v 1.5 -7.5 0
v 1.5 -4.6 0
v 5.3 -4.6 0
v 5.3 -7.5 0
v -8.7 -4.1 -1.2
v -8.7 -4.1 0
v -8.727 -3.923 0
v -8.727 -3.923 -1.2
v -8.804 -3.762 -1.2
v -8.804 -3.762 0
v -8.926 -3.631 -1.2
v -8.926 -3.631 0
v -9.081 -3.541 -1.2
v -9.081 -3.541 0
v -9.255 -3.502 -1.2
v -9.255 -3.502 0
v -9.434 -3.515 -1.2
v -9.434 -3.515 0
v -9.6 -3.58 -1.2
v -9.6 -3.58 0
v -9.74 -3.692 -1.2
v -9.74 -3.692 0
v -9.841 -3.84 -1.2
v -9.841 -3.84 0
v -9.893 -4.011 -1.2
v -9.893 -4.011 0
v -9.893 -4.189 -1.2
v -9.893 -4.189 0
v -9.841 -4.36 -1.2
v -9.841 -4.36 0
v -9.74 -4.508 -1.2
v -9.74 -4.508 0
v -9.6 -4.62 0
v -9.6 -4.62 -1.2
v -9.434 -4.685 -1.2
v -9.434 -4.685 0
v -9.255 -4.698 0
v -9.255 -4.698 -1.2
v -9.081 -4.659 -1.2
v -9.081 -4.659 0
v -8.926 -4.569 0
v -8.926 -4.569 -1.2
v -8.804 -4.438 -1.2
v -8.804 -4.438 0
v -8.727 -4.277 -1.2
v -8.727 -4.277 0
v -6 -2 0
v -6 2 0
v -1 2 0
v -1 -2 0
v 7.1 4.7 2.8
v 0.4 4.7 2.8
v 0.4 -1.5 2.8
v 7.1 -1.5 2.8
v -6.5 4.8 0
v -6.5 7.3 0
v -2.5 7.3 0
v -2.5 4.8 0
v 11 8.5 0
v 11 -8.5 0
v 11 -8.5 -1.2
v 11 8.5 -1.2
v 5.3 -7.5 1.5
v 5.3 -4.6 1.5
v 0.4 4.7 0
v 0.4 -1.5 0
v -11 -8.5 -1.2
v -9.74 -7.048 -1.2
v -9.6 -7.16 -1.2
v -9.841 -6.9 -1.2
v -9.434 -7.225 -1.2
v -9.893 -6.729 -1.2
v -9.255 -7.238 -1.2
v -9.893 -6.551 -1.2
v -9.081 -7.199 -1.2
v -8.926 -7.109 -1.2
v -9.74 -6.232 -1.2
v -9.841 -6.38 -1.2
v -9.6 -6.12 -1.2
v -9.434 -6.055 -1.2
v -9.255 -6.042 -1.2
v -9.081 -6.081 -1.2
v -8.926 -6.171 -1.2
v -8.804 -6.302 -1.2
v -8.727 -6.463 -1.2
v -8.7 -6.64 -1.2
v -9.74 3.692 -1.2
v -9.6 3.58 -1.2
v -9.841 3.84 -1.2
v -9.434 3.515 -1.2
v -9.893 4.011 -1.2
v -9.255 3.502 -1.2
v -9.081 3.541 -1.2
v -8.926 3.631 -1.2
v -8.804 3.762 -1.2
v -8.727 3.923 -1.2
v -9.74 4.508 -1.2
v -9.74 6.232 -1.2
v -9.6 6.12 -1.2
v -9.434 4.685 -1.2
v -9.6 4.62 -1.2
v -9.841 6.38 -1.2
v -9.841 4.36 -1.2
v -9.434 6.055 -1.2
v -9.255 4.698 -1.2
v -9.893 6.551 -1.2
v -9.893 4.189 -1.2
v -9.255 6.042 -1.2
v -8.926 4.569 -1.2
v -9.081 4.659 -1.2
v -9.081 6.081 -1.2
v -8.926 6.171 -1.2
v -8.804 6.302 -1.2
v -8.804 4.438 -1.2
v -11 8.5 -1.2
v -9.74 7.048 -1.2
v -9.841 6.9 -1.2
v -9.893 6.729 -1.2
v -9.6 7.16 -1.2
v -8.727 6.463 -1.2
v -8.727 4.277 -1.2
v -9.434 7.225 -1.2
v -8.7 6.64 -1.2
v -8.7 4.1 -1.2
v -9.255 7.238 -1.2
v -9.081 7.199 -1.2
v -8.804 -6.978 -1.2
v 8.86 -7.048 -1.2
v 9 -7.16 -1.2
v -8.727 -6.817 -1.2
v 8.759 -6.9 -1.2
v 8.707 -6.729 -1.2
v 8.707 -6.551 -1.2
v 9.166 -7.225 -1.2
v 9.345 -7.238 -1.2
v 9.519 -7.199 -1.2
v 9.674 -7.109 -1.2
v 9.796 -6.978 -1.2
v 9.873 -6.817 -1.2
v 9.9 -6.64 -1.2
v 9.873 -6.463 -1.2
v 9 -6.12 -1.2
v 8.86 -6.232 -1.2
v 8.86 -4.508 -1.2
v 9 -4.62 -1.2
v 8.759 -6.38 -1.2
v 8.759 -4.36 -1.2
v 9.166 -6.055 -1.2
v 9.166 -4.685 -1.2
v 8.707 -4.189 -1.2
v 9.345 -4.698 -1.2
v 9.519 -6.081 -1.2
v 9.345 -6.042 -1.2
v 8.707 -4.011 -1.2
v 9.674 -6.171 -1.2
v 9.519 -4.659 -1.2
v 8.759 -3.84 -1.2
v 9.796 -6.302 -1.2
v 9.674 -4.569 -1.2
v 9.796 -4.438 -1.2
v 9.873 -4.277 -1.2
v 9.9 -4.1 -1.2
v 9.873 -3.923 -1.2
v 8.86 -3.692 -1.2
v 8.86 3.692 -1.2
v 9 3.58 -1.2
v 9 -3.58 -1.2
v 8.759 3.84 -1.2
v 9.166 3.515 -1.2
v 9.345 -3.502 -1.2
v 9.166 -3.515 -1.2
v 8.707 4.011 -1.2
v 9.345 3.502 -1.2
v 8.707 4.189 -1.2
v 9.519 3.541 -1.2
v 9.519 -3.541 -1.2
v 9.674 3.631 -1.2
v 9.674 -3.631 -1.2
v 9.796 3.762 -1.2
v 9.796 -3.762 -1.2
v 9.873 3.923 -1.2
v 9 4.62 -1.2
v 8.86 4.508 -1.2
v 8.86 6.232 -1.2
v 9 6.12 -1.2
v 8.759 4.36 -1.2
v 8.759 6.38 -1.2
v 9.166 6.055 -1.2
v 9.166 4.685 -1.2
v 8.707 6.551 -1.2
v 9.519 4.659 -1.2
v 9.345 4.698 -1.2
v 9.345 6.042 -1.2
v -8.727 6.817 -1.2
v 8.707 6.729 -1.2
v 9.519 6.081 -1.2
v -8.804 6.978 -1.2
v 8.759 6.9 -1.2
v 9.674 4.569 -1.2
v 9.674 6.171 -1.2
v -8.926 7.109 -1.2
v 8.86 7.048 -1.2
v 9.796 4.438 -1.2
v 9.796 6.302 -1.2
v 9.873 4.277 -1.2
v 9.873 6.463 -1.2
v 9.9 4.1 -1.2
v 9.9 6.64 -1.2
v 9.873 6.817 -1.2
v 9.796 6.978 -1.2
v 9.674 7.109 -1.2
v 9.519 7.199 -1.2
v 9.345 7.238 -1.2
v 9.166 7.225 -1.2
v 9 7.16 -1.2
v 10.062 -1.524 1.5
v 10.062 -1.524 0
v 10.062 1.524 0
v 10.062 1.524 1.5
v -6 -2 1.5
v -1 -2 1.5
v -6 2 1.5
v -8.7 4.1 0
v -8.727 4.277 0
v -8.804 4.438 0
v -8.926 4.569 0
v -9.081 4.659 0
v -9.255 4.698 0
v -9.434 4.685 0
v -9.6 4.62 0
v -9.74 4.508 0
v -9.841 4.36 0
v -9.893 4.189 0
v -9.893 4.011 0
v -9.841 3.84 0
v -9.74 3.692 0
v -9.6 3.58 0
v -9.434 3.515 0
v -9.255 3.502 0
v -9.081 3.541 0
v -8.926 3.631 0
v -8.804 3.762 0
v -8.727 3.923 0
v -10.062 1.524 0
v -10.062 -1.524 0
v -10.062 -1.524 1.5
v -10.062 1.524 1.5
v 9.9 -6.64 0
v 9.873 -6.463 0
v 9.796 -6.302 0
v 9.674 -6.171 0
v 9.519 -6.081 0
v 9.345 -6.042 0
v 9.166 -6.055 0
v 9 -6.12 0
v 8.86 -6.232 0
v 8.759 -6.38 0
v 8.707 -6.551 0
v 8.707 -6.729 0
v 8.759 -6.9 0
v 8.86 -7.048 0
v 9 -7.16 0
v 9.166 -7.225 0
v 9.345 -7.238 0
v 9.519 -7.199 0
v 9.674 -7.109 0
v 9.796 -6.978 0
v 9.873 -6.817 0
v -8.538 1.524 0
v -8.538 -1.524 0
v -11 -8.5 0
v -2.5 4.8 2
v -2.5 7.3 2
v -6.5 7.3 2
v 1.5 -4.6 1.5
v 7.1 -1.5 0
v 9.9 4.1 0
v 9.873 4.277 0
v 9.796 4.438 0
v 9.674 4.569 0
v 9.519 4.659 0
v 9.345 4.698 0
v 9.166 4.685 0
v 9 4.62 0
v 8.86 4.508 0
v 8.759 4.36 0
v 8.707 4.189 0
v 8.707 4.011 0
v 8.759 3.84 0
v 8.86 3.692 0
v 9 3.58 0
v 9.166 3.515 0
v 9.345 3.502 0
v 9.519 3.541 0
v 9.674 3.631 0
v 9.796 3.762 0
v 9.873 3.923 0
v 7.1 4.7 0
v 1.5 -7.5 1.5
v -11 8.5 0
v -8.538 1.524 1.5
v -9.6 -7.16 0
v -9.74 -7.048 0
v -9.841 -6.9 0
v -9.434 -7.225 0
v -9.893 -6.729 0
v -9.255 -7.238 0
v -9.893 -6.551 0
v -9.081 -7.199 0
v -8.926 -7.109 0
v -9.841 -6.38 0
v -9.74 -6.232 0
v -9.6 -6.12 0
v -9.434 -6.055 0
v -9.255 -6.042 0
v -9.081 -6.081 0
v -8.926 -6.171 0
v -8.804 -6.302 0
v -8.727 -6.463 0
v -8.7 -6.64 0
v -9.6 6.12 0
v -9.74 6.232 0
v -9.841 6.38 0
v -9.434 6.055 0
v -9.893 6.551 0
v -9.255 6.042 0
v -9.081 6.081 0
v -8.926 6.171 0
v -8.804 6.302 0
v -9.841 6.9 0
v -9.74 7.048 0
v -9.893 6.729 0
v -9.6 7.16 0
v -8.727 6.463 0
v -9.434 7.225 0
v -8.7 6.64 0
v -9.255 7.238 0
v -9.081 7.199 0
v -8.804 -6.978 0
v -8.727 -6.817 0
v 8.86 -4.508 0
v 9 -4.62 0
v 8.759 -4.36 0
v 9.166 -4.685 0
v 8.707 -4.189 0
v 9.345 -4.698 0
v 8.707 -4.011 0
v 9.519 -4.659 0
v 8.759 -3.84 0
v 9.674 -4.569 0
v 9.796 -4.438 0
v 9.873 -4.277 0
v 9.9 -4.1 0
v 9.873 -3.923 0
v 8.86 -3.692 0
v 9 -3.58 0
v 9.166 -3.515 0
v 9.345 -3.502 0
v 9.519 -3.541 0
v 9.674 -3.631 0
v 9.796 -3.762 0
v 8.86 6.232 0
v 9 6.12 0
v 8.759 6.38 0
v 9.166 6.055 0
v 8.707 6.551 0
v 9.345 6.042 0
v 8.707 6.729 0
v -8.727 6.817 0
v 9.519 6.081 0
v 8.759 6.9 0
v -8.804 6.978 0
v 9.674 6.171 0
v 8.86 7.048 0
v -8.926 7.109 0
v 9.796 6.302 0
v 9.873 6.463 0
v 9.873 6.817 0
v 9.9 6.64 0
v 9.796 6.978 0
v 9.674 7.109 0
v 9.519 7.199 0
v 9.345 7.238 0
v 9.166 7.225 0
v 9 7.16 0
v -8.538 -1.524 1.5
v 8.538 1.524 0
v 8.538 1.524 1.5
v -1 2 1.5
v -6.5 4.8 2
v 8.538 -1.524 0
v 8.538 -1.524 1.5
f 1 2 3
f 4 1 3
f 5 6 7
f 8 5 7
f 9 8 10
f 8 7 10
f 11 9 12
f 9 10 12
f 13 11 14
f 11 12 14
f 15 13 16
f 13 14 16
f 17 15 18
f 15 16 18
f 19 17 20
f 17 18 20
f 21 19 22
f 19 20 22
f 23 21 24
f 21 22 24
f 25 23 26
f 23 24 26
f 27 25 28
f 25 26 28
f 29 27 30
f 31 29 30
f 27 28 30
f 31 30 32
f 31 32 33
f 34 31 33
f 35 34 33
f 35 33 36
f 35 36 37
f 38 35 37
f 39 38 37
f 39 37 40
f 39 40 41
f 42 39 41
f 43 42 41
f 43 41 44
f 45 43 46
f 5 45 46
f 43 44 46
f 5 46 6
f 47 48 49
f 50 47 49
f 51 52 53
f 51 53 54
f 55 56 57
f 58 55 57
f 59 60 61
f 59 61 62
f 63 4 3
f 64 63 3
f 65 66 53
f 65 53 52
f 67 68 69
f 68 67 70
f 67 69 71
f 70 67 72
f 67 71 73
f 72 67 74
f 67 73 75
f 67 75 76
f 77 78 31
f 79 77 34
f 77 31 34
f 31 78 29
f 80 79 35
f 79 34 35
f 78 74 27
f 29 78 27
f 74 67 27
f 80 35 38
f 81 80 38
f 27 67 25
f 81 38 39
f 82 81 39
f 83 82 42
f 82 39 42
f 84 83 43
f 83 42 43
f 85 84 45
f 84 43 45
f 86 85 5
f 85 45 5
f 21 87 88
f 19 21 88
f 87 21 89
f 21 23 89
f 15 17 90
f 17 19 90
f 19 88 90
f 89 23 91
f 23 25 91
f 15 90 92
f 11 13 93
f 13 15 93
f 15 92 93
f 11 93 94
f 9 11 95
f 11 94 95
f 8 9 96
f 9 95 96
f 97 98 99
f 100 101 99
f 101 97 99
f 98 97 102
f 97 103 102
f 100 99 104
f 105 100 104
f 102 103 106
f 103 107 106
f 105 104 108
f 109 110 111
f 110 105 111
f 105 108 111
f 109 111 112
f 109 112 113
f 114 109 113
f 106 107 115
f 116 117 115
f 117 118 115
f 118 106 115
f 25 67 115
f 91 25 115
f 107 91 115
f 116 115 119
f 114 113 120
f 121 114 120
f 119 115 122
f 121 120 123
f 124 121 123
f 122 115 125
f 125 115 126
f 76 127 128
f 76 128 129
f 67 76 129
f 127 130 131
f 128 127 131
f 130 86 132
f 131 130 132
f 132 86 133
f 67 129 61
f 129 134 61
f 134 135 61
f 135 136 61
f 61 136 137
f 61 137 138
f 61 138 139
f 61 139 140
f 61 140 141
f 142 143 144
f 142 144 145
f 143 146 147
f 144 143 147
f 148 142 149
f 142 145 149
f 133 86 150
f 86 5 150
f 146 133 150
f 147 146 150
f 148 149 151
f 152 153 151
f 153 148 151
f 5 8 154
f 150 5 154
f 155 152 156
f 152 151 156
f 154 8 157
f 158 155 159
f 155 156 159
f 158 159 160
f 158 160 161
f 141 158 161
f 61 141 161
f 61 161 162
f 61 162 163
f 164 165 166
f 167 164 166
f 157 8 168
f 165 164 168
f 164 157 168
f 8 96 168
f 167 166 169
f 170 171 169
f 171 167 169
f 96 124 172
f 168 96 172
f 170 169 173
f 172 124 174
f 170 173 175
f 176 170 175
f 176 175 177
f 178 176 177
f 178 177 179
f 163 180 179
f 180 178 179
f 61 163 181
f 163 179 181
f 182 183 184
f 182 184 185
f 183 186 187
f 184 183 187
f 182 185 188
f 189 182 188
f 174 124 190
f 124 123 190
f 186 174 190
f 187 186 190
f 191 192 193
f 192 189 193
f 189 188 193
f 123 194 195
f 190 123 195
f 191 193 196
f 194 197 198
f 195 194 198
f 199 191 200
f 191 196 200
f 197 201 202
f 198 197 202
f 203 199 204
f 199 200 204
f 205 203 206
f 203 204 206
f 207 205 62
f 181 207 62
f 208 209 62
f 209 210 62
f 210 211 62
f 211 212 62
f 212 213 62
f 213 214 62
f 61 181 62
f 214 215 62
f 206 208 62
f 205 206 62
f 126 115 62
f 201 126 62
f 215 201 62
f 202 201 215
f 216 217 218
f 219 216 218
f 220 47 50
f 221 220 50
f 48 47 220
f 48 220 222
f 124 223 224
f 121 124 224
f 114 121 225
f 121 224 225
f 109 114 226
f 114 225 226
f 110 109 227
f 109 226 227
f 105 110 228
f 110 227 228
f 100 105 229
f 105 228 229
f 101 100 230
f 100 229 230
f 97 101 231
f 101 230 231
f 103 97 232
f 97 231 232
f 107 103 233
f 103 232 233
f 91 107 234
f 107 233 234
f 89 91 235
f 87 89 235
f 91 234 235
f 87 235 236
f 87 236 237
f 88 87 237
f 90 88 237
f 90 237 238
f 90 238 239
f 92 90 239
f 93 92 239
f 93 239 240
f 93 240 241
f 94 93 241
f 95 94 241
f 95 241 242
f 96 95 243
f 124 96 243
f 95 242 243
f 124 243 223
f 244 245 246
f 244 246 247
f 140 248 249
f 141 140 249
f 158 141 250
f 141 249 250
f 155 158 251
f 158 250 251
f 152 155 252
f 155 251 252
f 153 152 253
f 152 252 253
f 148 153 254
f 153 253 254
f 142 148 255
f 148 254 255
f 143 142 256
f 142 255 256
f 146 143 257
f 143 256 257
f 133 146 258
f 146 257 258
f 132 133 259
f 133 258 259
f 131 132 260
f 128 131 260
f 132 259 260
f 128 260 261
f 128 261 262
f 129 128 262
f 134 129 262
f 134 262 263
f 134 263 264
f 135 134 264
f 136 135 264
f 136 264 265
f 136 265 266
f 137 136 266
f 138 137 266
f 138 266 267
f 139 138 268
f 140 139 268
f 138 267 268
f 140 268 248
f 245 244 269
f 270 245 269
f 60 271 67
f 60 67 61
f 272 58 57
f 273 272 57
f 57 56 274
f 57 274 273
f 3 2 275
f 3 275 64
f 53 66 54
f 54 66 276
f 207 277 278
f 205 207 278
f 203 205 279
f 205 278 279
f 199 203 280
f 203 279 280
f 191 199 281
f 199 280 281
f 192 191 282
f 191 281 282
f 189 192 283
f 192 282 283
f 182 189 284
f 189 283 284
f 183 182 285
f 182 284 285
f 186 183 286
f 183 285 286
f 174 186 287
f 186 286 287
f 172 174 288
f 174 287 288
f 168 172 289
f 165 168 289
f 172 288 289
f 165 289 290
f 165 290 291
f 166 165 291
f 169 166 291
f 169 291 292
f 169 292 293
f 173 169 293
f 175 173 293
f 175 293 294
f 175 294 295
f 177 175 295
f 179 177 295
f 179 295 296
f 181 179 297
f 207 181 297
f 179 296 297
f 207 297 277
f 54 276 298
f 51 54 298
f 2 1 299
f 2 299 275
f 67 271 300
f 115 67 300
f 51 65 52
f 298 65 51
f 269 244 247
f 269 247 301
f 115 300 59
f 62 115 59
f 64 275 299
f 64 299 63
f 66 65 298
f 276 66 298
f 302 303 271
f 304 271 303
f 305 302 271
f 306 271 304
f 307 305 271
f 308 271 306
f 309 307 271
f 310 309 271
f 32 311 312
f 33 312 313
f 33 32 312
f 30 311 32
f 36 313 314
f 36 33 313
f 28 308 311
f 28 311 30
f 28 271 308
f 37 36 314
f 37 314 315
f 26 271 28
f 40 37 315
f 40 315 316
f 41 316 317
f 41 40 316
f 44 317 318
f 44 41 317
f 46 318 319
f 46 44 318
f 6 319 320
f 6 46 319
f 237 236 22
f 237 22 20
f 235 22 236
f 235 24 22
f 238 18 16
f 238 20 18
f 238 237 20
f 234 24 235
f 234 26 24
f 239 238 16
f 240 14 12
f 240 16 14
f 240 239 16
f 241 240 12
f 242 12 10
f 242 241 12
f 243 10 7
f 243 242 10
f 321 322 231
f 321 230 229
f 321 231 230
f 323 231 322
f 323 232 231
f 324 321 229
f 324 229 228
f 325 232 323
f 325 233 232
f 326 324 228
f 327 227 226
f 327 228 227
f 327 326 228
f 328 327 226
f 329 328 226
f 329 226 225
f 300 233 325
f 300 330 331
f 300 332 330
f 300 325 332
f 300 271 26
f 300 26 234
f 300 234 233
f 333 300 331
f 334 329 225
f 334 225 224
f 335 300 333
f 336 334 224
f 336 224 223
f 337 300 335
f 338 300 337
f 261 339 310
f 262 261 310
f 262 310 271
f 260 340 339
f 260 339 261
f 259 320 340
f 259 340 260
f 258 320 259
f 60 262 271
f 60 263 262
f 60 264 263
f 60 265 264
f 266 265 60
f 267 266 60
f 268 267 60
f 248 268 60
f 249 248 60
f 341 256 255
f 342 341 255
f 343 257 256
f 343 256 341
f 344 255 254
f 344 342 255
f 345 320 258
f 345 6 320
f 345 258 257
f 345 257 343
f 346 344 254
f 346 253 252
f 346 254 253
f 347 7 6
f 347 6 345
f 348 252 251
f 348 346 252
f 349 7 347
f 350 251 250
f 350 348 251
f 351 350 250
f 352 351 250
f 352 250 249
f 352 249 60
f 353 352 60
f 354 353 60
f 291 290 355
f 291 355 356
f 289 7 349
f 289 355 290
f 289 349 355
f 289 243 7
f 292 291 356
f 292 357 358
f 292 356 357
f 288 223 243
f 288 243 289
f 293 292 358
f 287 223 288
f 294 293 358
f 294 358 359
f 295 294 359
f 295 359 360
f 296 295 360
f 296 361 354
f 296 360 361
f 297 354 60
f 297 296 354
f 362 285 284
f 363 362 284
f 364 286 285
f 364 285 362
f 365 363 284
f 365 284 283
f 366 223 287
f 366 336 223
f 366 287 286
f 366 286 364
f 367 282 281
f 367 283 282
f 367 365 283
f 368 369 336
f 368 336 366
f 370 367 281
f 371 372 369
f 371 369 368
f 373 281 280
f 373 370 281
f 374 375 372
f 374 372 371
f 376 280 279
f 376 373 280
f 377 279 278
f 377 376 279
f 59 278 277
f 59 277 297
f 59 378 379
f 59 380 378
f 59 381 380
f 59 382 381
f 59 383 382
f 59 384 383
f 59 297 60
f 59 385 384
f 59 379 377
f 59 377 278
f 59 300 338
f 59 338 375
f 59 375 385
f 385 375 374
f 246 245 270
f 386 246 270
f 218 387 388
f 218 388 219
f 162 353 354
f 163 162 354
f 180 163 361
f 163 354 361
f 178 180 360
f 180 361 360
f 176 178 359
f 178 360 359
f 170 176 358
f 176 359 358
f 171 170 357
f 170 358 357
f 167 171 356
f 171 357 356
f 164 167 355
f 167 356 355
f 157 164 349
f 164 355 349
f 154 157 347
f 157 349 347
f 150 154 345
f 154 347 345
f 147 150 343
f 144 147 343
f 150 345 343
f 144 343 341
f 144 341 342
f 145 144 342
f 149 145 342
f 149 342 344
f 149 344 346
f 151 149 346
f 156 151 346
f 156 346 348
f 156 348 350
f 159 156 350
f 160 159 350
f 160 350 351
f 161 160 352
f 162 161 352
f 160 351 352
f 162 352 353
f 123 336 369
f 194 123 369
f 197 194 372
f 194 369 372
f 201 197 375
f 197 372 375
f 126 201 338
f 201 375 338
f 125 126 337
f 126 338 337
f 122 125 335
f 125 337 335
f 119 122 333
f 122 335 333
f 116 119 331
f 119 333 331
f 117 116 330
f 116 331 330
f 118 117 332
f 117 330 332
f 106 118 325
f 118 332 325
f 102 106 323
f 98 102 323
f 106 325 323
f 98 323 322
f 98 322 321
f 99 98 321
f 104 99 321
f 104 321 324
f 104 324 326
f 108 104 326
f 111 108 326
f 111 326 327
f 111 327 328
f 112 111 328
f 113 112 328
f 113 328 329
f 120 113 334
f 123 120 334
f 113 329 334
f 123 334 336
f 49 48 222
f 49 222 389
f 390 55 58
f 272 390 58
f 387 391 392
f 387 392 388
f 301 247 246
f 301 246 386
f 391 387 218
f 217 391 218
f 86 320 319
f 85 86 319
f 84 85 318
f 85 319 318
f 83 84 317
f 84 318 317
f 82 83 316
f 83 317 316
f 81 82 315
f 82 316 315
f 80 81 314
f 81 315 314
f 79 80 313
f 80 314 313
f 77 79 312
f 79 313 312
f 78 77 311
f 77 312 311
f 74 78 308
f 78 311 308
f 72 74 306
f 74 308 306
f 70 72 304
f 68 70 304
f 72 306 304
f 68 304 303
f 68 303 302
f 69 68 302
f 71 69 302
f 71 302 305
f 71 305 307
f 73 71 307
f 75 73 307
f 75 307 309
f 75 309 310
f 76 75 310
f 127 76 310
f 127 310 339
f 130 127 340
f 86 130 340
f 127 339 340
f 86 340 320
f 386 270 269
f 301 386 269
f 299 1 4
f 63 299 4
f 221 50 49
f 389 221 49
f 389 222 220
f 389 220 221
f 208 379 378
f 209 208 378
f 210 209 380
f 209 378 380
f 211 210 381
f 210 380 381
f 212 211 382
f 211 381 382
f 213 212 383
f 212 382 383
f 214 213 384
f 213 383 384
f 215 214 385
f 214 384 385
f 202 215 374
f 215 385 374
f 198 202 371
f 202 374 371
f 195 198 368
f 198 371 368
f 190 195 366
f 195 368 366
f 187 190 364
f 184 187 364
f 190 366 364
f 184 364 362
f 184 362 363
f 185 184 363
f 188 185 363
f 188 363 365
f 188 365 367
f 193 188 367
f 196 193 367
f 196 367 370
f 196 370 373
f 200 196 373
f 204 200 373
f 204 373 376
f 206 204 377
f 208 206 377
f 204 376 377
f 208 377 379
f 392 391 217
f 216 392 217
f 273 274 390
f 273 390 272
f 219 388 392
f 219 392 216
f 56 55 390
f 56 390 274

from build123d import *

# Parameters (mm, degrees)
F0_W     = 22
F0_H     = 17
F0_R     = 0.6
F1_DEPTH = 1.2
F2_W     = 1.524
F2_H     = 3.048
F2_W_2   = 5
F2_H_2   = 4
F2_W_3   = 3.8
F2_H_3   = 2.9
F3_DEPTH = 1.5
F2_W_4   = 4
F2_H_4   = 2.5
F4_DEPTH = 2
F2_W_5   = 6.7
F2_H_5   = 6.2
F5_DEPTH = 2.8


with BuildPart() as f1:
    # F0 (on Top) → F1 (new body)
    with BuildSketch(Plane.XY):
        Rectangle(F0_W, F0_H)
        with Locations((-9.3, -6.64)):
            Circle(F0_R, mode=Mode.SUBTRACT)
        with Locations((-9.3, -4.1)):
            Circle(F0_R, mode=Mode.SUBTRACT)
        with Locations((9.3, -6.64)):
            Circle(F0_R, mode=Mode.SUBTRACT)
        with Locations((9.3, -4.1)):
            Circle(F0_R, mode=Mode.SUBTRACT)
        with Locations((-9.3, 4.1)):
            Circle(F0_R, mode=Mode.SUBTRACT)
        with Locations((-9.3, 6.64)):
            Circle(F0_R, mode=Mode.SUBTRACT)
        with Locations((9.3, 4.1)):
            Circle(F0_R, mode=Mode.SUBTRACT)
        with Locations((9.3, 6.64)):
            Circle(F0_R, mode=Mode.SUBTRACT)
    extrude(amount=-F1_DEPTH)


with BuildPart() as f3:
    # F2 (on Top) → F3 (new body)
    with BuildSketch(Plane.XY):
        with Locations((9.3, 0)):
            Rectangle(F2_W, F2_H)
        with Locations((-3.5, 0)):
            Rectangle(F2_W_2, F2_H_2)
        with Locations((3.4, -6.05)):
            Rectangle(F2_W_3, F2_H_3)
        with Locations((-9.3, 0)):
            Rectangle(F2_W, F2_H)
    extrude(amount=F3_DEPTH)


with BuildPart() as f4:
    # F2 (on Top) → F4 (new body)
    with BuildSketch(Plane.XY):
        with Locations((-4.5, 6.05)):
            Rectangle(F2_W_4, F2_H_4)
    extrude(amount=F4_DEPTH)


with BuildPart() as f5:
    # F2 (on Top) → F5 (new body)
    with BuildSketch(Plane.XY):
        with Locations((3.75, 1.6)):
            Rectangle(F2_W_5, F2_H_5)
    extrude(amount=F5_DEPTH)


solid = Compound([f1.part, f3.part, f4.part, f5.part])
